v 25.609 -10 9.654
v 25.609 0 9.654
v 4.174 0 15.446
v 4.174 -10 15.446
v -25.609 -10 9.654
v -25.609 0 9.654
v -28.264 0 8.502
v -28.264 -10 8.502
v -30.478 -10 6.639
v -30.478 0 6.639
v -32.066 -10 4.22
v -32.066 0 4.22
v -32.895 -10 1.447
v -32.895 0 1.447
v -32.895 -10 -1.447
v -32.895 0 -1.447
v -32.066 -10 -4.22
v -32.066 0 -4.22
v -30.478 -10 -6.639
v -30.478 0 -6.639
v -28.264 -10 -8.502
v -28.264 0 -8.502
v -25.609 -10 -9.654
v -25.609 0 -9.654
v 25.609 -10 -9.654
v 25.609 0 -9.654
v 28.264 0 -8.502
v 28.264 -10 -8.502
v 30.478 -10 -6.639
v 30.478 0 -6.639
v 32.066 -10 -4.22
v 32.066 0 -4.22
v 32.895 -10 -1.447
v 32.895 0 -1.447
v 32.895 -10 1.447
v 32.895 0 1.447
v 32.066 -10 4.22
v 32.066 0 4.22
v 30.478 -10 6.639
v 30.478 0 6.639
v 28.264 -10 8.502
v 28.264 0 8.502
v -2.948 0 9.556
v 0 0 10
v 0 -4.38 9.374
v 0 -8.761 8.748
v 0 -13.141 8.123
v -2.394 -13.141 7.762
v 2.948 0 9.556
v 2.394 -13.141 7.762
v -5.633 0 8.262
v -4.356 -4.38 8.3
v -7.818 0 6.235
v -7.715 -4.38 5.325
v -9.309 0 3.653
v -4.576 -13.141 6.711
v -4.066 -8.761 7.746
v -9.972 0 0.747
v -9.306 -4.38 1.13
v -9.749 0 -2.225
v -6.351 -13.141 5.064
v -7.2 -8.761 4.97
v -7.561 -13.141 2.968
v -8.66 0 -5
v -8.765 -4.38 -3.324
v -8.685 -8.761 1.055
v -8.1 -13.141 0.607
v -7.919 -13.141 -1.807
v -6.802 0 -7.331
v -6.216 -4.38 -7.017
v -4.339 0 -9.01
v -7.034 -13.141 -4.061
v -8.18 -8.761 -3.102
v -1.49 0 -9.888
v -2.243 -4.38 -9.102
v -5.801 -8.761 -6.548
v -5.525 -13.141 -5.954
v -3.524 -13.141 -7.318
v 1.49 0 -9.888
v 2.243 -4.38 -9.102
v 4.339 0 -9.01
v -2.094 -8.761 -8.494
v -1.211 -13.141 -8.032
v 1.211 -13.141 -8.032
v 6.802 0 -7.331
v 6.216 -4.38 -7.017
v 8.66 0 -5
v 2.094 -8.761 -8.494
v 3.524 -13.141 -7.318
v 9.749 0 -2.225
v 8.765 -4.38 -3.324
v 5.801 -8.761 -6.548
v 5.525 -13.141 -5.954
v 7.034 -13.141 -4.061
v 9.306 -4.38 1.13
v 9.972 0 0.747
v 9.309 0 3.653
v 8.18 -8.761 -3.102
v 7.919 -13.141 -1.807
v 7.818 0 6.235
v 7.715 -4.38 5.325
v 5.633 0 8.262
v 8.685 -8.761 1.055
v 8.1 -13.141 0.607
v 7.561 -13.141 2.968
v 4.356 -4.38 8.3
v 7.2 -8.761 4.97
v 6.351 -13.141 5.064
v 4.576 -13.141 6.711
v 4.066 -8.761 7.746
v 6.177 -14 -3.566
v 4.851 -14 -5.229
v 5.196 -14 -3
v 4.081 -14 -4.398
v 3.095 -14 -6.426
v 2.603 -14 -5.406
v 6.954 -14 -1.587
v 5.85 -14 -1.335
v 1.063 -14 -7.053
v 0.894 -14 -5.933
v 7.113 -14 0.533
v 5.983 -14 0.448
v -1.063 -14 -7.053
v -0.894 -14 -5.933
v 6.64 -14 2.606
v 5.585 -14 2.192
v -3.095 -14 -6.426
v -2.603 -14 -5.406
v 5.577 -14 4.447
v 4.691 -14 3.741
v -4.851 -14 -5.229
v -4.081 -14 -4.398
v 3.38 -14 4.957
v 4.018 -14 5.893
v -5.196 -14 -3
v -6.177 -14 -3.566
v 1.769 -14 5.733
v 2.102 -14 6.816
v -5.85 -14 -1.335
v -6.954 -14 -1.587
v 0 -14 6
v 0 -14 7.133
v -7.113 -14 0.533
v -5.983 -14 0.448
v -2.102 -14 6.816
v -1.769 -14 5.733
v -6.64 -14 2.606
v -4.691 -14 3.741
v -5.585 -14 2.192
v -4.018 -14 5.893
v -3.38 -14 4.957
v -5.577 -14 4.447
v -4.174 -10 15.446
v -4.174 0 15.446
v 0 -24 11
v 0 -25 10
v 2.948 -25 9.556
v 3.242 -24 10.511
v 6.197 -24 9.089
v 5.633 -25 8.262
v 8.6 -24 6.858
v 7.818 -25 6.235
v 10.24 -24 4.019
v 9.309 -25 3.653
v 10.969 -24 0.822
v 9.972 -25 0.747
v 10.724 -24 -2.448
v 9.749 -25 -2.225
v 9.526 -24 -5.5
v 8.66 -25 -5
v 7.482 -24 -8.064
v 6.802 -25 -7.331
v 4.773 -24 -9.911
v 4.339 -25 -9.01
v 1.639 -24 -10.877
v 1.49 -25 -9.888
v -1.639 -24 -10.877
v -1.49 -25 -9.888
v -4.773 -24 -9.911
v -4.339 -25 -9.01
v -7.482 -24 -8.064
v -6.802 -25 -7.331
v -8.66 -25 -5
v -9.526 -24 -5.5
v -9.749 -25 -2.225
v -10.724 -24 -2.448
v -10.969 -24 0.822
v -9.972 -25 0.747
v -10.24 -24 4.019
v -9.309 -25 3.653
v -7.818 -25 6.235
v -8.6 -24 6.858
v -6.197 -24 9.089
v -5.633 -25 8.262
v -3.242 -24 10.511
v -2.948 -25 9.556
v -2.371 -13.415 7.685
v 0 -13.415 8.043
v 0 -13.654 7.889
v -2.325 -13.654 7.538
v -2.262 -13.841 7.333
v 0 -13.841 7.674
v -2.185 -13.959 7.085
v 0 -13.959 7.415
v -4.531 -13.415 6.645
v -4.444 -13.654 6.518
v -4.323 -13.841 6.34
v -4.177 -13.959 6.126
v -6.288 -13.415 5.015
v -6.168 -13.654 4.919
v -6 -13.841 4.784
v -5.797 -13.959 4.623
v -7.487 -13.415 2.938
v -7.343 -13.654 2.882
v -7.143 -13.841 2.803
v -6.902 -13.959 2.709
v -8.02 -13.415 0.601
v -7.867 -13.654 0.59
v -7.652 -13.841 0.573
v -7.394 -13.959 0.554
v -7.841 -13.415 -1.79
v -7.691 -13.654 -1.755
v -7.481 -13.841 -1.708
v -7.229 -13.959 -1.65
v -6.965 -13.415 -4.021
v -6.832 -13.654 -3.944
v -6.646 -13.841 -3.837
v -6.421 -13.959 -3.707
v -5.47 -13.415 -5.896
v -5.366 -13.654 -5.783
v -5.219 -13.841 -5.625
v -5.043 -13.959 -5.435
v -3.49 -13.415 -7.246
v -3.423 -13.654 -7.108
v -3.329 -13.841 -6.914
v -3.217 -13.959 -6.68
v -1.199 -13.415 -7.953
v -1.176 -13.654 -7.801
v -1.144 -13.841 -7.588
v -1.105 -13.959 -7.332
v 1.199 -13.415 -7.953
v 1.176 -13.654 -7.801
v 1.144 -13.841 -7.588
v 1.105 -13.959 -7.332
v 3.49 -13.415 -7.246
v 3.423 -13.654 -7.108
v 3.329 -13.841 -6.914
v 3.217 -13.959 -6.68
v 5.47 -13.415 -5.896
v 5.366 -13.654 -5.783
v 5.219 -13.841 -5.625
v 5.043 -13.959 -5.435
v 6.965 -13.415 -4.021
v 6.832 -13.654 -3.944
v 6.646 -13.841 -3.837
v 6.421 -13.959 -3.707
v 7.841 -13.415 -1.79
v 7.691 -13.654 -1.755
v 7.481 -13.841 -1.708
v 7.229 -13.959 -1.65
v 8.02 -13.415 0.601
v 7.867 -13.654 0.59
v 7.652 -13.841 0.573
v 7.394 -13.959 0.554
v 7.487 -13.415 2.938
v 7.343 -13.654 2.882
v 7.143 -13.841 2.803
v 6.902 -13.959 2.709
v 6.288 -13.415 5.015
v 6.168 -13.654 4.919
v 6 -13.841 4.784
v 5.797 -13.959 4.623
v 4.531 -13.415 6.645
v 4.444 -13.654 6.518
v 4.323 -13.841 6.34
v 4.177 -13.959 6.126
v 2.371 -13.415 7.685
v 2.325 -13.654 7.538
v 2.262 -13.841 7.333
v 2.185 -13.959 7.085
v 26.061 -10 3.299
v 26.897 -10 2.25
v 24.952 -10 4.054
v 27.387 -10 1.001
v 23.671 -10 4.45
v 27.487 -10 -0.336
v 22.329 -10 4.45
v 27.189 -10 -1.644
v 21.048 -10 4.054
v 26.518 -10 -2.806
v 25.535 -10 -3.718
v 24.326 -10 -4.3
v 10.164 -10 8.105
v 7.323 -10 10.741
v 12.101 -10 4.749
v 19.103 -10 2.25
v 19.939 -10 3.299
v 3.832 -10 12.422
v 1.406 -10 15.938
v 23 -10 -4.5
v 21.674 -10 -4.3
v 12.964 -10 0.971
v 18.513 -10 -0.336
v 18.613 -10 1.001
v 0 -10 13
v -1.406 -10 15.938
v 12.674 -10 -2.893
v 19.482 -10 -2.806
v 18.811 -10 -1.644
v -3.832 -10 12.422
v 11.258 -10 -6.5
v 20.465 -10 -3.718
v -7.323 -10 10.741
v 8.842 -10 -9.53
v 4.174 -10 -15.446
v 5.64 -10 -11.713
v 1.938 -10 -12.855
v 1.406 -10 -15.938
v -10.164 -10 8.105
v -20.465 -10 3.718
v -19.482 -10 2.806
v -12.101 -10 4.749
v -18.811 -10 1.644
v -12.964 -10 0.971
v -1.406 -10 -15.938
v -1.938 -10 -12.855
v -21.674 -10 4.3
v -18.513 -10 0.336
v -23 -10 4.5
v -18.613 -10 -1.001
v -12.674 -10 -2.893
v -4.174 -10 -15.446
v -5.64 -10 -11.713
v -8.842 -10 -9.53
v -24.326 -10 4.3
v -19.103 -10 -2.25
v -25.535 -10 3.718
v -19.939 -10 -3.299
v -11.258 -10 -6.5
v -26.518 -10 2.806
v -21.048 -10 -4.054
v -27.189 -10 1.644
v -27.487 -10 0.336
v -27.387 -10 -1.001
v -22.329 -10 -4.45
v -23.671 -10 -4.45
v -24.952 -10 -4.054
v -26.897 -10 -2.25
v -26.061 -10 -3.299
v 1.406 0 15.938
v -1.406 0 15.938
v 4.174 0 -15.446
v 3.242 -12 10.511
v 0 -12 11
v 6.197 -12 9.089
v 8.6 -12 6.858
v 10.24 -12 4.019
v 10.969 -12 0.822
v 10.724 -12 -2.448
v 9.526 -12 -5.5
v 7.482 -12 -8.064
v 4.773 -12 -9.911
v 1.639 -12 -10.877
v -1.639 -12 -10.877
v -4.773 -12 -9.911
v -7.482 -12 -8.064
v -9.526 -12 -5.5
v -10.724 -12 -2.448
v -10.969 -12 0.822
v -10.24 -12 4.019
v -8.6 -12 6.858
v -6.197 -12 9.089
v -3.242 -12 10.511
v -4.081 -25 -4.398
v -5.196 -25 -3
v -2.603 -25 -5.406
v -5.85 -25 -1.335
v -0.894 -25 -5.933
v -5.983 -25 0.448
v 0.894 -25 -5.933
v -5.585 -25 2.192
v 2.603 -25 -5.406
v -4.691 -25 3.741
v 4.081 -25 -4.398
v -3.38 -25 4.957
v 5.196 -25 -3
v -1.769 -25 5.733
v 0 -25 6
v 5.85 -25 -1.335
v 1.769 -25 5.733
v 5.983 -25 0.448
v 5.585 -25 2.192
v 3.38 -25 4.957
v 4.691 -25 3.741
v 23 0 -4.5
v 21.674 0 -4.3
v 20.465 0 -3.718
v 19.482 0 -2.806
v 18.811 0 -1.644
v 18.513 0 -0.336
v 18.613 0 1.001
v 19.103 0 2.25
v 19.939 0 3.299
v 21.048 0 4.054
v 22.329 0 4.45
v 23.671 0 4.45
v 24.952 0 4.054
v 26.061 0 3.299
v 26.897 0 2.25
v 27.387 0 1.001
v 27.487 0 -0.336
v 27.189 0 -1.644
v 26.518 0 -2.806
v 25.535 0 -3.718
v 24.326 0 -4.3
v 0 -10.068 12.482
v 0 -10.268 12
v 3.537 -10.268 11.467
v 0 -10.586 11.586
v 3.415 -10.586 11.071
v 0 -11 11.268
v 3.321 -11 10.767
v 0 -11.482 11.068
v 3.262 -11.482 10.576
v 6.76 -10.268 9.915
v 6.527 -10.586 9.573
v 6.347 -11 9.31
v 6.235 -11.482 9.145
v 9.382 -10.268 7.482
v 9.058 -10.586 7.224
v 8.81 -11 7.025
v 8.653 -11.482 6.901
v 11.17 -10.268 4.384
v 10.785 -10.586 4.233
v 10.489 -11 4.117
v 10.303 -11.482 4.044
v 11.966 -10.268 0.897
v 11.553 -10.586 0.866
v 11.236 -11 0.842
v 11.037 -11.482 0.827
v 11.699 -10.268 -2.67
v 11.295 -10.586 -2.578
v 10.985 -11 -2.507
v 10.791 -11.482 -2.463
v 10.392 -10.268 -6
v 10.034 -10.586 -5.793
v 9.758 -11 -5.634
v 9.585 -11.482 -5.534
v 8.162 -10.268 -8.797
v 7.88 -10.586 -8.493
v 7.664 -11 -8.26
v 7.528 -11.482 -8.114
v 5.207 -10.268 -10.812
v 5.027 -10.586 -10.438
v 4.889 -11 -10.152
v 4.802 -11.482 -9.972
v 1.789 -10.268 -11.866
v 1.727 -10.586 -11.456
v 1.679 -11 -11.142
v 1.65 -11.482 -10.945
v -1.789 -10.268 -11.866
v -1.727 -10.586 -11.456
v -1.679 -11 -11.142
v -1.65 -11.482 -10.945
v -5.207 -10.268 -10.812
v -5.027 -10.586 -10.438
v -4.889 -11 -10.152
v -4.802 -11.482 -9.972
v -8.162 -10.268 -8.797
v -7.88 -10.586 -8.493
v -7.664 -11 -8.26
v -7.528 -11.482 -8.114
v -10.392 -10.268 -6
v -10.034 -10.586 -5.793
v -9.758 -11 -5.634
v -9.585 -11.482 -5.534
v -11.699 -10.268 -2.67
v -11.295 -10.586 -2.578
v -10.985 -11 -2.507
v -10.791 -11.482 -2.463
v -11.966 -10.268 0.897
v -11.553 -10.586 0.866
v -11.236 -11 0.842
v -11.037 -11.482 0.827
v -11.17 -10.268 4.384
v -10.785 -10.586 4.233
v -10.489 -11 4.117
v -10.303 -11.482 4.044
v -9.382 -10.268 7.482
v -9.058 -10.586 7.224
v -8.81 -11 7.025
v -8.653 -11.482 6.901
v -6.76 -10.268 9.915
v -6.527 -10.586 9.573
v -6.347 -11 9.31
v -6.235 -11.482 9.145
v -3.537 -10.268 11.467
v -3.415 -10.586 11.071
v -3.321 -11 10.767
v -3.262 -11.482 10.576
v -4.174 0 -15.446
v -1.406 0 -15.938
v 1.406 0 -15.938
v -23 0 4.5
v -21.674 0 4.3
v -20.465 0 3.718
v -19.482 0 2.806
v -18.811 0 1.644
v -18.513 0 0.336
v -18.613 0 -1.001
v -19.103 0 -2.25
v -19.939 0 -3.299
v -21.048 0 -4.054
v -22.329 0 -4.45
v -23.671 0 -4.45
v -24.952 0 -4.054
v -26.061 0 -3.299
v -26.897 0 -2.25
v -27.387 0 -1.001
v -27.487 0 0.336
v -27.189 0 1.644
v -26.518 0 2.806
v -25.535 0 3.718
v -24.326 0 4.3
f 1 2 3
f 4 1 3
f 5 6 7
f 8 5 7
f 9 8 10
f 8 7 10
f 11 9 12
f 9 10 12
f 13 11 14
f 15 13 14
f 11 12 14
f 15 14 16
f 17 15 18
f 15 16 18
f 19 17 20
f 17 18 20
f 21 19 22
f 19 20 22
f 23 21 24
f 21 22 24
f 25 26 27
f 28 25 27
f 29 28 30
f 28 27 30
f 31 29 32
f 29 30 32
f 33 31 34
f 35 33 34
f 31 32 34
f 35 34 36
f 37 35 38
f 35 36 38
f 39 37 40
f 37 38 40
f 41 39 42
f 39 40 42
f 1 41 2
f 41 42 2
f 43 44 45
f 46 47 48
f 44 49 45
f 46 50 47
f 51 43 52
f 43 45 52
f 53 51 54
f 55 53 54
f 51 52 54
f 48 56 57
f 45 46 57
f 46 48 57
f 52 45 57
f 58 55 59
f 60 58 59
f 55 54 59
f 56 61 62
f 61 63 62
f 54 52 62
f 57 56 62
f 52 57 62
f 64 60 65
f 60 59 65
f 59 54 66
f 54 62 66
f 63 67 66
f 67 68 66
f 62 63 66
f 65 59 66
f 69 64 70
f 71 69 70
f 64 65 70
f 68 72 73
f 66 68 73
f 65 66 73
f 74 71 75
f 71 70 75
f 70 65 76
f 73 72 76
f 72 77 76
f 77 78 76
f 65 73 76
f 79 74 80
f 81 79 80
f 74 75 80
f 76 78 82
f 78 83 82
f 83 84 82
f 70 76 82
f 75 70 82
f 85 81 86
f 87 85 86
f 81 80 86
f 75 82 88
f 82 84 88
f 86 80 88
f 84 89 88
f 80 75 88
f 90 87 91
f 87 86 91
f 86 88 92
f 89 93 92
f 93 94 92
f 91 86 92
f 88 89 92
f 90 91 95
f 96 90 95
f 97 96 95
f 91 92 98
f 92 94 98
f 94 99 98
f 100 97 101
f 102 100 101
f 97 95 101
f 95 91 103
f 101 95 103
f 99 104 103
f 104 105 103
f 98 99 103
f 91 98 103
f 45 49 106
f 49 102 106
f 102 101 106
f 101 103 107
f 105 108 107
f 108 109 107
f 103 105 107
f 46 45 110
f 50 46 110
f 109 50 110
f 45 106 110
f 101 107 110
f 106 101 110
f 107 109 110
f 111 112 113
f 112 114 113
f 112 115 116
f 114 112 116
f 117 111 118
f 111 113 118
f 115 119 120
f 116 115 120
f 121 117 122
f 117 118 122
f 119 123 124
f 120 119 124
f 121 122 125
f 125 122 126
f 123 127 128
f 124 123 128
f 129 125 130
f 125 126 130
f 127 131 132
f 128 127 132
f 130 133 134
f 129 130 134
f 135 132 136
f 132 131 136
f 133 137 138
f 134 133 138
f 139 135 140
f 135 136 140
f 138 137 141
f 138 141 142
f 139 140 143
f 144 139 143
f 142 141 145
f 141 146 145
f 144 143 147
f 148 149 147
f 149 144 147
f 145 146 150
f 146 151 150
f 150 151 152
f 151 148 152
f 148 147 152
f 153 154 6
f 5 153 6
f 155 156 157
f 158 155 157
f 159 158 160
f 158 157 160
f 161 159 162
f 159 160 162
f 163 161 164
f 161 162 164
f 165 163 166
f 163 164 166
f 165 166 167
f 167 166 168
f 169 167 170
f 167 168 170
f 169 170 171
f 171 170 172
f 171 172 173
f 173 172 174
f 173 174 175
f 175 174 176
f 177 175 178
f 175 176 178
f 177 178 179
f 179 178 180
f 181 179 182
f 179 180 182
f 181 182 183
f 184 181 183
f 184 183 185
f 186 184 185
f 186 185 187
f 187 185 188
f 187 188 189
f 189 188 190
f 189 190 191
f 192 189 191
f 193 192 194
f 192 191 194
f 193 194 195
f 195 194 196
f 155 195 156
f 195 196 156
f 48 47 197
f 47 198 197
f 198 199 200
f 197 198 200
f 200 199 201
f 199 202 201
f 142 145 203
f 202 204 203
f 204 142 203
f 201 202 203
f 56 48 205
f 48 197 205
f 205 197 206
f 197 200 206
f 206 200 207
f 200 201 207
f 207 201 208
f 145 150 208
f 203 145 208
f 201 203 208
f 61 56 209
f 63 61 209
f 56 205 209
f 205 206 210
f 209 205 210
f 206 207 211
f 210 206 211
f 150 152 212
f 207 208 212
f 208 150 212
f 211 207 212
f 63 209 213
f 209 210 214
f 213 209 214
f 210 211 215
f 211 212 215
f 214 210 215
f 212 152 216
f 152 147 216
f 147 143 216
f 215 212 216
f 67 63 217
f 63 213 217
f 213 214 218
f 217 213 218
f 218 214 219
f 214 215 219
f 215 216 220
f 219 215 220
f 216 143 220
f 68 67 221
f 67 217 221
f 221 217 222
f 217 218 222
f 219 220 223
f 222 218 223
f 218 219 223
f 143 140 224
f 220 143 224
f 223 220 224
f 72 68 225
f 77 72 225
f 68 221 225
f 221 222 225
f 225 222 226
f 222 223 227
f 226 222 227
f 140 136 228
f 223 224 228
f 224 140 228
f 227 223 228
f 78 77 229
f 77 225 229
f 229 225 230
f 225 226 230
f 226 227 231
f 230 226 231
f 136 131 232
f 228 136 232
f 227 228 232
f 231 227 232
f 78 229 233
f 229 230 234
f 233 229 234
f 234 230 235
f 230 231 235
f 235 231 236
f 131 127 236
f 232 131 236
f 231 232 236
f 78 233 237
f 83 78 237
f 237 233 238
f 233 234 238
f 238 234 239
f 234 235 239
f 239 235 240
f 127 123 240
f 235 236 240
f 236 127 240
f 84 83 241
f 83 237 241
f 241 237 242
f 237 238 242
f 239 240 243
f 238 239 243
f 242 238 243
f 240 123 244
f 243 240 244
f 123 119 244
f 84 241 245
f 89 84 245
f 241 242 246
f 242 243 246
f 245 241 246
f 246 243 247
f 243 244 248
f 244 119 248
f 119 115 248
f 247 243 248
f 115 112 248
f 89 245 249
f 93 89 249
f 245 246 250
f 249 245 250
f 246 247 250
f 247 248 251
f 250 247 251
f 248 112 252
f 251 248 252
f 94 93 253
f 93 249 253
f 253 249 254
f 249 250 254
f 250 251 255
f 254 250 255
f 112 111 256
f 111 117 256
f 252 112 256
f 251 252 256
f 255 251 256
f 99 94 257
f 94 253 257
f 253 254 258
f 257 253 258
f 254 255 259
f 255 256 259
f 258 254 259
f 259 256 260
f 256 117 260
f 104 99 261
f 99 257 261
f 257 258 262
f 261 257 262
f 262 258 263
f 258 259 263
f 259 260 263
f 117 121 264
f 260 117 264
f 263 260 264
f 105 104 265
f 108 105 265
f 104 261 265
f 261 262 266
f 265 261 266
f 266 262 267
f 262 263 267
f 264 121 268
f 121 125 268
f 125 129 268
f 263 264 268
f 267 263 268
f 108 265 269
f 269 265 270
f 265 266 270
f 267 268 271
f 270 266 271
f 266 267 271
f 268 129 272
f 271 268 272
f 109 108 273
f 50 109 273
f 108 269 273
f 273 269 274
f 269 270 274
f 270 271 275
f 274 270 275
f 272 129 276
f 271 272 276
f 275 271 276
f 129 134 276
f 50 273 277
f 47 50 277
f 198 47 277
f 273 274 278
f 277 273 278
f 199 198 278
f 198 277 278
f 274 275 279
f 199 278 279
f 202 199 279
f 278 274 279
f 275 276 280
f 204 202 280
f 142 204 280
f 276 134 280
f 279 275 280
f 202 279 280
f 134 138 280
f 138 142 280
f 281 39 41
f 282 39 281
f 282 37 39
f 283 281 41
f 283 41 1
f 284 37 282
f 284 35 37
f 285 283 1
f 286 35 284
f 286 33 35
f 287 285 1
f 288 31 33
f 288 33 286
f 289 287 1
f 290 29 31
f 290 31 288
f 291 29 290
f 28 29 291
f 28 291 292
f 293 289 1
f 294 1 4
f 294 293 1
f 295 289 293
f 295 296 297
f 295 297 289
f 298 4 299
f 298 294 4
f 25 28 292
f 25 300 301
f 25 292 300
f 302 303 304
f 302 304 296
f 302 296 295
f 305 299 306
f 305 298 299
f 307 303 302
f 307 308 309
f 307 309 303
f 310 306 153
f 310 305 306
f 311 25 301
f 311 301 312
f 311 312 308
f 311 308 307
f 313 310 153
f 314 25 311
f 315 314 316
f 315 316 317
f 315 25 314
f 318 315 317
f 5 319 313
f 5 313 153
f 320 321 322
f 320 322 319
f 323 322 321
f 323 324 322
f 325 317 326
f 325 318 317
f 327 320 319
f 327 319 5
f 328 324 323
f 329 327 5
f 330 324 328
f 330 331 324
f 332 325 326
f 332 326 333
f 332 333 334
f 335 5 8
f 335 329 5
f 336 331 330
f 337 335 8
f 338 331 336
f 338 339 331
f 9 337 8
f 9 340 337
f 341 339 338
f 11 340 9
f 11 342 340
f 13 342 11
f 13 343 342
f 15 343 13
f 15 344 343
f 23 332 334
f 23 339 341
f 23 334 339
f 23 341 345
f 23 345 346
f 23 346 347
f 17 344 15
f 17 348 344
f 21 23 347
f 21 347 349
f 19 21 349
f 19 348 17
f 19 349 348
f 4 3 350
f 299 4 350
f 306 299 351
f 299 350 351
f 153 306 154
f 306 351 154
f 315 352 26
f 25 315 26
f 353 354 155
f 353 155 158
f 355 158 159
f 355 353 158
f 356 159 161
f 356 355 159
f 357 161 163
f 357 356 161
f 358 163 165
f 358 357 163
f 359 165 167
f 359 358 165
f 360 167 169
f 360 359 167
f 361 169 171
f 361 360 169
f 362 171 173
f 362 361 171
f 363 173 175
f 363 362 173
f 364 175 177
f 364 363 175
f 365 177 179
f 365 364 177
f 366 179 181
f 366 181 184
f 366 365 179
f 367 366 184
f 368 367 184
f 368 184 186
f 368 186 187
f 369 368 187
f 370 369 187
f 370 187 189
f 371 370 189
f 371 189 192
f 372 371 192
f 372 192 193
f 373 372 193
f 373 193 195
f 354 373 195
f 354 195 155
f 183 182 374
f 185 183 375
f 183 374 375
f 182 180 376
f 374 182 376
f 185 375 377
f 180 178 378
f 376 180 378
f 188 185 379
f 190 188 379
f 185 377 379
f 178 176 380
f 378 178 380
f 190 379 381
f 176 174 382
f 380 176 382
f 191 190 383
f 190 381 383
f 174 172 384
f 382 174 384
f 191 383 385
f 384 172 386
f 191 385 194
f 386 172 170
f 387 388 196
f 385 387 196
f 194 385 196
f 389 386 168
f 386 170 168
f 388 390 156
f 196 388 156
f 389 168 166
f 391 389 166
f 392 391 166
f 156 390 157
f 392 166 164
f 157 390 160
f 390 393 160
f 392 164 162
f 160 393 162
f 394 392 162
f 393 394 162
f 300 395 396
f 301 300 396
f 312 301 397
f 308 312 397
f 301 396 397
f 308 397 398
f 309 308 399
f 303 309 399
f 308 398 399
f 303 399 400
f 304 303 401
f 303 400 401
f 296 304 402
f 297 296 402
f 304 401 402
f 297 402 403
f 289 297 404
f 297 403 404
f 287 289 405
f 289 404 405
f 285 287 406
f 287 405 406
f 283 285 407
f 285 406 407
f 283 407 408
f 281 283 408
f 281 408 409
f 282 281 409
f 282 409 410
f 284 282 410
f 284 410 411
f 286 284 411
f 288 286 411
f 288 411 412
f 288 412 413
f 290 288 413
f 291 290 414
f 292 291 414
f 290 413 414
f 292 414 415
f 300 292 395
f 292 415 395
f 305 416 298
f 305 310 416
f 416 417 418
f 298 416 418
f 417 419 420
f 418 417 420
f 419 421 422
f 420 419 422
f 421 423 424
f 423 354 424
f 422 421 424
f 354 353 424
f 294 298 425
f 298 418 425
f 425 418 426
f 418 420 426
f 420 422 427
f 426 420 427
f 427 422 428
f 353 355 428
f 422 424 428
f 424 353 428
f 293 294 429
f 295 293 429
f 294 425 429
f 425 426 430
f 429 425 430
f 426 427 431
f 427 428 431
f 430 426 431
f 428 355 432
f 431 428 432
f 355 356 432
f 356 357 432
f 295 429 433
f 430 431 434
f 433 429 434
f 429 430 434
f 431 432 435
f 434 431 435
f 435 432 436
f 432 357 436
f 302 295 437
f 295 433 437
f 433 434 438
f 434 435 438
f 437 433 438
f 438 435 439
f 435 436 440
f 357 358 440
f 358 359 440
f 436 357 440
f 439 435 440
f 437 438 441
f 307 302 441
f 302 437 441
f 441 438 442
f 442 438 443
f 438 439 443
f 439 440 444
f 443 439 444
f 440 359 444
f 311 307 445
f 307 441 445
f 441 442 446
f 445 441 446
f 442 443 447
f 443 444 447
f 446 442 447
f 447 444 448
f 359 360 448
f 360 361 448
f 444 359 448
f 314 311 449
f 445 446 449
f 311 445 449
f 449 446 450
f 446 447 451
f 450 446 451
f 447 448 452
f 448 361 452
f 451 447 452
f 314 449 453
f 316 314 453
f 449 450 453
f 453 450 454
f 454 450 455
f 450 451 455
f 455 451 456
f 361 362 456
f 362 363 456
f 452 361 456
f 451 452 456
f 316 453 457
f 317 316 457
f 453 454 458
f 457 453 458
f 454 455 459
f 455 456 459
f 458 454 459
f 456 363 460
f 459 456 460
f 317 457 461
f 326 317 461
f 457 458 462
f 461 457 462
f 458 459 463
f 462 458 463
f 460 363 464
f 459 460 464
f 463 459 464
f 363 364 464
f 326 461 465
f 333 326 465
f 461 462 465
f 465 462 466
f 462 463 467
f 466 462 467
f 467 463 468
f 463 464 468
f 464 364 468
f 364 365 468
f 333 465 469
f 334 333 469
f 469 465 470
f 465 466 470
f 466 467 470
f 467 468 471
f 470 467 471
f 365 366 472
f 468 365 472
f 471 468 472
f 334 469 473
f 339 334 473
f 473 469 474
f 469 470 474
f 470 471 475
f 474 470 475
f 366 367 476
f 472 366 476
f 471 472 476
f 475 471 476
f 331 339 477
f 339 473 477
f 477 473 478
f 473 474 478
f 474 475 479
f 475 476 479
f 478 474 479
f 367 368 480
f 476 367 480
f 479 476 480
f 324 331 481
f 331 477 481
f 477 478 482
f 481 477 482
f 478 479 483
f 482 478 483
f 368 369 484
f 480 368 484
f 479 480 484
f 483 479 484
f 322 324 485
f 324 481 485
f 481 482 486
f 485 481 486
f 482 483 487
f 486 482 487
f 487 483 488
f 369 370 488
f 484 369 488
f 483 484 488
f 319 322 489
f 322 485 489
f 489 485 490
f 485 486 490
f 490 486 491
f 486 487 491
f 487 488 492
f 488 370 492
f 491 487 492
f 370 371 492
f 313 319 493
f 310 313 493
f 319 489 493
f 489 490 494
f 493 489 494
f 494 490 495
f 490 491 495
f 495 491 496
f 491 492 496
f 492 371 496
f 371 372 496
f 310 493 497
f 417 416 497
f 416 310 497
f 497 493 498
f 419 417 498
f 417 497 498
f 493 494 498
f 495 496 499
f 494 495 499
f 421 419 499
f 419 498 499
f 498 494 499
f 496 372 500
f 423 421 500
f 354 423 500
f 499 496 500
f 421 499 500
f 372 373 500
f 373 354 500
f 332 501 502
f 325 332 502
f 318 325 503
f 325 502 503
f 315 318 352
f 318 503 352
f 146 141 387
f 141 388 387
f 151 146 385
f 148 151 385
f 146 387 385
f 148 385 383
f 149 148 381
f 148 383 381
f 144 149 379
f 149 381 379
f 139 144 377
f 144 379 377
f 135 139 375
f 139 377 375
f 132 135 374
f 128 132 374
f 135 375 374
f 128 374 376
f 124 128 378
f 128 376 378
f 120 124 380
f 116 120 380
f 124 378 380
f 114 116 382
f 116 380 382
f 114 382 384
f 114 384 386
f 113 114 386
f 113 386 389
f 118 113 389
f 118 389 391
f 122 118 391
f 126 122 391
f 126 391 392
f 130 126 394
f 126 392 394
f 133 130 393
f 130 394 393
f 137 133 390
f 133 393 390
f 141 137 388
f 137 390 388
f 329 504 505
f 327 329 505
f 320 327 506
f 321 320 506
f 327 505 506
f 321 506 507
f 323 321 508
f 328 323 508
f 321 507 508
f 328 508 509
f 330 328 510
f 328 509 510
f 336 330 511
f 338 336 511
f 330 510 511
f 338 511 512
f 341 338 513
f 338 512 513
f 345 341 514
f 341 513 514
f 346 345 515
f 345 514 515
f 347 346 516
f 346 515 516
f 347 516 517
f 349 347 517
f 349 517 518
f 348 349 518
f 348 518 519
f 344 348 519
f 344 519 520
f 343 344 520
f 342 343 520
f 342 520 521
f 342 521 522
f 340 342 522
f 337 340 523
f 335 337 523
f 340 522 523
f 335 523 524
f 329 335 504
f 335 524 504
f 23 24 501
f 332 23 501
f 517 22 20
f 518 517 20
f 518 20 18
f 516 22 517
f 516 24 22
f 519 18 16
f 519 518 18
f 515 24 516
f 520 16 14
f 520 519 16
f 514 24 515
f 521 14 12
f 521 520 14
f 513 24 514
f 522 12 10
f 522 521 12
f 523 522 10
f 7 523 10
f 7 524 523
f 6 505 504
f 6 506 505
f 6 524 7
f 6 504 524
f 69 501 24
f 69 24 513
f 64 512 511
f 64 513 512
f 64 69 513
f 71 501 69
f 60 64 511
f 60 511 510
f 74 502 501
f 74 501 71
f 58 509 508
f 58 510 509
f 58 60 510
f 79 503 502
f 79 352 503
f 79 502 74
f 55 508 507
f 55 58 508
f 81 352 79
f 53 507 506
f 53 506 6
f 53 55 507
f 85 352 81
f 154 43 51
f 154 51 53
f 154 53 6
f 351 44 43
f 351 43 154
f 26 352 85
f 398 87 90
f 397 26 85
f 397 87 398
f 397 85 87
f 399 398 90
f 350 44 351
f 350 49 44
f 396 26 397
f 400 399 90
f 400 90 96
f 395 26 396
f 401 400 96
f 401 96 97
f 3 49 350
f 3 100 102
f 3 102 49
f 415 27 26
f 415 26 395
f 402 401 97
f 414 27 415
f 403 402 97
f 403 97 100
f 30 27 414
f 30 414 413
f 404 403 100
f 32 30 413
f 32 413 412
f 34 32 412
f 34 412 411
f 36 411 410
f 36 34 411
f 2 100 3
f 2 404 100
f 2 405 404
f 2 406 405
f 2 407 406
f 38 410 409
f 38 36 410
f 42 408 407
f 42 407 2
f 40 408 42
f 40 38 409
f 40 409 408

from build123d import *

# Parameters (mm, degrees)
SKETCH_1_R      = 4.5
EXTRUDE_1_DEPTH = 10
SKETCH_2_R      = 11
EXTRUDE_2_DEPTH = 25
FILLET_1_R      = 2
CHAMFER_1_SIZE  = 1


with BuildPart() as part:
    # Эскиз1 → Бобышка-Вытянуть1 (new body)
    with BuildSketch(Plane(origin=(0, 0, 0), x_dir=(1, 0, 0), z_dir=(0, 1, 0))):
        with BuildLine():
            Line((-25.608695652, 9.65374057), (-4.173913043, 15.445984912))
            ThreePointArc((-4.173913043, 15.445984912), (0, 16), (4.173913043, 15.445984912))
            Line((4.173913043, 15.445984912), (25.608695652, 9.65374057))
            ThreePointArc((25.608695652, 9.65374057), (33, 0), (25.608695652, -9.65374057))
            Line((25.608695652, -9.65374057), (4.173913043, -15.445984912))
            ThreePointArc((4.173913043, -15.445984912), (0, -16), (-4.173913043, -15.445984912))
            Line((-4.173913043, -15.445984912), (-25.608695652, -9.65374057))
            ThreePointArc((-25.608695652, -9.65374057), (-33, 0), (-25.608695652, 9.65374057))
        make_face()
        with Locations(Location((-23, 0, 0), (0, 0, 270))):
            Circle(SKETCH_1_R, mode=Mode.SUBTRACT)
        with Locations(Location((23, 0, 0), (0, 0, 90))):
            Circle(SKETCH_1_R, mode=Mode.SUBTRACT)
    extrude(amount=-EXTRUDE_1_DEPTH)

    # Эскиз2 → Бобышка-Вытянуть2 (add)
    with BuildSketch(Plane(origin=(0, 0, 0), x_dir=(1, 0, 0), z_dir=(0, 1, 0))):
        with Locations(Location((0, 0, 0), (0, 0, 270))):
            Circle(SKETCH_2_R)
    extrude(amount=-EXTRUDE_2_DEPTH)

    # Эскиз3 → Вырез-Повернуть1 (revolve, cut)
    with BuildSketch(Plane.XY, mode=Mode.PRIVATE) as cut_revolve_1_sk:
        with BuildLine():
            Line((0, 0), (-10, 0))
            Line((-10, 0), (-8.122654092, -13.141421356))
            ThreePointArc((-8.122654092, -13.141421356), (-7.78790634, -13.755453955), (-7.132704598, -14))
            Line((-7.132704598, -14), (-6, -14))
            Line((-6, -14), (-6, -25))
            Line((-6, -25), (0, -25))
            Line((0, -25), (0, 0))
        make_face()
    revolve(cut_revolve_1_sk.sketch.rotate(Axis((0, 4.006279318, 0), (0, -1, 0)), 270), axis=Axis((0, 4.006279318, 0), (0, -1, 0)), mode=Mode.SUBTRACT)

    # Скругление1
    fillet_1_edges = [part.edges().sort_by_distance(p)[0] for p in [
        (0, -10, -11),
    ]]
    fillet(fillet_1_edges, radius=FILLET_1_R)

    # Фаска1
    chamfer_1_edges = [part.edges().sort_by_distance(p)[0] for p in [
        (0, -25, -11),
    ]]
    chamfer(chamfer_1_edges, length=CHAMFER_1_SIZE)


solid = part.part
